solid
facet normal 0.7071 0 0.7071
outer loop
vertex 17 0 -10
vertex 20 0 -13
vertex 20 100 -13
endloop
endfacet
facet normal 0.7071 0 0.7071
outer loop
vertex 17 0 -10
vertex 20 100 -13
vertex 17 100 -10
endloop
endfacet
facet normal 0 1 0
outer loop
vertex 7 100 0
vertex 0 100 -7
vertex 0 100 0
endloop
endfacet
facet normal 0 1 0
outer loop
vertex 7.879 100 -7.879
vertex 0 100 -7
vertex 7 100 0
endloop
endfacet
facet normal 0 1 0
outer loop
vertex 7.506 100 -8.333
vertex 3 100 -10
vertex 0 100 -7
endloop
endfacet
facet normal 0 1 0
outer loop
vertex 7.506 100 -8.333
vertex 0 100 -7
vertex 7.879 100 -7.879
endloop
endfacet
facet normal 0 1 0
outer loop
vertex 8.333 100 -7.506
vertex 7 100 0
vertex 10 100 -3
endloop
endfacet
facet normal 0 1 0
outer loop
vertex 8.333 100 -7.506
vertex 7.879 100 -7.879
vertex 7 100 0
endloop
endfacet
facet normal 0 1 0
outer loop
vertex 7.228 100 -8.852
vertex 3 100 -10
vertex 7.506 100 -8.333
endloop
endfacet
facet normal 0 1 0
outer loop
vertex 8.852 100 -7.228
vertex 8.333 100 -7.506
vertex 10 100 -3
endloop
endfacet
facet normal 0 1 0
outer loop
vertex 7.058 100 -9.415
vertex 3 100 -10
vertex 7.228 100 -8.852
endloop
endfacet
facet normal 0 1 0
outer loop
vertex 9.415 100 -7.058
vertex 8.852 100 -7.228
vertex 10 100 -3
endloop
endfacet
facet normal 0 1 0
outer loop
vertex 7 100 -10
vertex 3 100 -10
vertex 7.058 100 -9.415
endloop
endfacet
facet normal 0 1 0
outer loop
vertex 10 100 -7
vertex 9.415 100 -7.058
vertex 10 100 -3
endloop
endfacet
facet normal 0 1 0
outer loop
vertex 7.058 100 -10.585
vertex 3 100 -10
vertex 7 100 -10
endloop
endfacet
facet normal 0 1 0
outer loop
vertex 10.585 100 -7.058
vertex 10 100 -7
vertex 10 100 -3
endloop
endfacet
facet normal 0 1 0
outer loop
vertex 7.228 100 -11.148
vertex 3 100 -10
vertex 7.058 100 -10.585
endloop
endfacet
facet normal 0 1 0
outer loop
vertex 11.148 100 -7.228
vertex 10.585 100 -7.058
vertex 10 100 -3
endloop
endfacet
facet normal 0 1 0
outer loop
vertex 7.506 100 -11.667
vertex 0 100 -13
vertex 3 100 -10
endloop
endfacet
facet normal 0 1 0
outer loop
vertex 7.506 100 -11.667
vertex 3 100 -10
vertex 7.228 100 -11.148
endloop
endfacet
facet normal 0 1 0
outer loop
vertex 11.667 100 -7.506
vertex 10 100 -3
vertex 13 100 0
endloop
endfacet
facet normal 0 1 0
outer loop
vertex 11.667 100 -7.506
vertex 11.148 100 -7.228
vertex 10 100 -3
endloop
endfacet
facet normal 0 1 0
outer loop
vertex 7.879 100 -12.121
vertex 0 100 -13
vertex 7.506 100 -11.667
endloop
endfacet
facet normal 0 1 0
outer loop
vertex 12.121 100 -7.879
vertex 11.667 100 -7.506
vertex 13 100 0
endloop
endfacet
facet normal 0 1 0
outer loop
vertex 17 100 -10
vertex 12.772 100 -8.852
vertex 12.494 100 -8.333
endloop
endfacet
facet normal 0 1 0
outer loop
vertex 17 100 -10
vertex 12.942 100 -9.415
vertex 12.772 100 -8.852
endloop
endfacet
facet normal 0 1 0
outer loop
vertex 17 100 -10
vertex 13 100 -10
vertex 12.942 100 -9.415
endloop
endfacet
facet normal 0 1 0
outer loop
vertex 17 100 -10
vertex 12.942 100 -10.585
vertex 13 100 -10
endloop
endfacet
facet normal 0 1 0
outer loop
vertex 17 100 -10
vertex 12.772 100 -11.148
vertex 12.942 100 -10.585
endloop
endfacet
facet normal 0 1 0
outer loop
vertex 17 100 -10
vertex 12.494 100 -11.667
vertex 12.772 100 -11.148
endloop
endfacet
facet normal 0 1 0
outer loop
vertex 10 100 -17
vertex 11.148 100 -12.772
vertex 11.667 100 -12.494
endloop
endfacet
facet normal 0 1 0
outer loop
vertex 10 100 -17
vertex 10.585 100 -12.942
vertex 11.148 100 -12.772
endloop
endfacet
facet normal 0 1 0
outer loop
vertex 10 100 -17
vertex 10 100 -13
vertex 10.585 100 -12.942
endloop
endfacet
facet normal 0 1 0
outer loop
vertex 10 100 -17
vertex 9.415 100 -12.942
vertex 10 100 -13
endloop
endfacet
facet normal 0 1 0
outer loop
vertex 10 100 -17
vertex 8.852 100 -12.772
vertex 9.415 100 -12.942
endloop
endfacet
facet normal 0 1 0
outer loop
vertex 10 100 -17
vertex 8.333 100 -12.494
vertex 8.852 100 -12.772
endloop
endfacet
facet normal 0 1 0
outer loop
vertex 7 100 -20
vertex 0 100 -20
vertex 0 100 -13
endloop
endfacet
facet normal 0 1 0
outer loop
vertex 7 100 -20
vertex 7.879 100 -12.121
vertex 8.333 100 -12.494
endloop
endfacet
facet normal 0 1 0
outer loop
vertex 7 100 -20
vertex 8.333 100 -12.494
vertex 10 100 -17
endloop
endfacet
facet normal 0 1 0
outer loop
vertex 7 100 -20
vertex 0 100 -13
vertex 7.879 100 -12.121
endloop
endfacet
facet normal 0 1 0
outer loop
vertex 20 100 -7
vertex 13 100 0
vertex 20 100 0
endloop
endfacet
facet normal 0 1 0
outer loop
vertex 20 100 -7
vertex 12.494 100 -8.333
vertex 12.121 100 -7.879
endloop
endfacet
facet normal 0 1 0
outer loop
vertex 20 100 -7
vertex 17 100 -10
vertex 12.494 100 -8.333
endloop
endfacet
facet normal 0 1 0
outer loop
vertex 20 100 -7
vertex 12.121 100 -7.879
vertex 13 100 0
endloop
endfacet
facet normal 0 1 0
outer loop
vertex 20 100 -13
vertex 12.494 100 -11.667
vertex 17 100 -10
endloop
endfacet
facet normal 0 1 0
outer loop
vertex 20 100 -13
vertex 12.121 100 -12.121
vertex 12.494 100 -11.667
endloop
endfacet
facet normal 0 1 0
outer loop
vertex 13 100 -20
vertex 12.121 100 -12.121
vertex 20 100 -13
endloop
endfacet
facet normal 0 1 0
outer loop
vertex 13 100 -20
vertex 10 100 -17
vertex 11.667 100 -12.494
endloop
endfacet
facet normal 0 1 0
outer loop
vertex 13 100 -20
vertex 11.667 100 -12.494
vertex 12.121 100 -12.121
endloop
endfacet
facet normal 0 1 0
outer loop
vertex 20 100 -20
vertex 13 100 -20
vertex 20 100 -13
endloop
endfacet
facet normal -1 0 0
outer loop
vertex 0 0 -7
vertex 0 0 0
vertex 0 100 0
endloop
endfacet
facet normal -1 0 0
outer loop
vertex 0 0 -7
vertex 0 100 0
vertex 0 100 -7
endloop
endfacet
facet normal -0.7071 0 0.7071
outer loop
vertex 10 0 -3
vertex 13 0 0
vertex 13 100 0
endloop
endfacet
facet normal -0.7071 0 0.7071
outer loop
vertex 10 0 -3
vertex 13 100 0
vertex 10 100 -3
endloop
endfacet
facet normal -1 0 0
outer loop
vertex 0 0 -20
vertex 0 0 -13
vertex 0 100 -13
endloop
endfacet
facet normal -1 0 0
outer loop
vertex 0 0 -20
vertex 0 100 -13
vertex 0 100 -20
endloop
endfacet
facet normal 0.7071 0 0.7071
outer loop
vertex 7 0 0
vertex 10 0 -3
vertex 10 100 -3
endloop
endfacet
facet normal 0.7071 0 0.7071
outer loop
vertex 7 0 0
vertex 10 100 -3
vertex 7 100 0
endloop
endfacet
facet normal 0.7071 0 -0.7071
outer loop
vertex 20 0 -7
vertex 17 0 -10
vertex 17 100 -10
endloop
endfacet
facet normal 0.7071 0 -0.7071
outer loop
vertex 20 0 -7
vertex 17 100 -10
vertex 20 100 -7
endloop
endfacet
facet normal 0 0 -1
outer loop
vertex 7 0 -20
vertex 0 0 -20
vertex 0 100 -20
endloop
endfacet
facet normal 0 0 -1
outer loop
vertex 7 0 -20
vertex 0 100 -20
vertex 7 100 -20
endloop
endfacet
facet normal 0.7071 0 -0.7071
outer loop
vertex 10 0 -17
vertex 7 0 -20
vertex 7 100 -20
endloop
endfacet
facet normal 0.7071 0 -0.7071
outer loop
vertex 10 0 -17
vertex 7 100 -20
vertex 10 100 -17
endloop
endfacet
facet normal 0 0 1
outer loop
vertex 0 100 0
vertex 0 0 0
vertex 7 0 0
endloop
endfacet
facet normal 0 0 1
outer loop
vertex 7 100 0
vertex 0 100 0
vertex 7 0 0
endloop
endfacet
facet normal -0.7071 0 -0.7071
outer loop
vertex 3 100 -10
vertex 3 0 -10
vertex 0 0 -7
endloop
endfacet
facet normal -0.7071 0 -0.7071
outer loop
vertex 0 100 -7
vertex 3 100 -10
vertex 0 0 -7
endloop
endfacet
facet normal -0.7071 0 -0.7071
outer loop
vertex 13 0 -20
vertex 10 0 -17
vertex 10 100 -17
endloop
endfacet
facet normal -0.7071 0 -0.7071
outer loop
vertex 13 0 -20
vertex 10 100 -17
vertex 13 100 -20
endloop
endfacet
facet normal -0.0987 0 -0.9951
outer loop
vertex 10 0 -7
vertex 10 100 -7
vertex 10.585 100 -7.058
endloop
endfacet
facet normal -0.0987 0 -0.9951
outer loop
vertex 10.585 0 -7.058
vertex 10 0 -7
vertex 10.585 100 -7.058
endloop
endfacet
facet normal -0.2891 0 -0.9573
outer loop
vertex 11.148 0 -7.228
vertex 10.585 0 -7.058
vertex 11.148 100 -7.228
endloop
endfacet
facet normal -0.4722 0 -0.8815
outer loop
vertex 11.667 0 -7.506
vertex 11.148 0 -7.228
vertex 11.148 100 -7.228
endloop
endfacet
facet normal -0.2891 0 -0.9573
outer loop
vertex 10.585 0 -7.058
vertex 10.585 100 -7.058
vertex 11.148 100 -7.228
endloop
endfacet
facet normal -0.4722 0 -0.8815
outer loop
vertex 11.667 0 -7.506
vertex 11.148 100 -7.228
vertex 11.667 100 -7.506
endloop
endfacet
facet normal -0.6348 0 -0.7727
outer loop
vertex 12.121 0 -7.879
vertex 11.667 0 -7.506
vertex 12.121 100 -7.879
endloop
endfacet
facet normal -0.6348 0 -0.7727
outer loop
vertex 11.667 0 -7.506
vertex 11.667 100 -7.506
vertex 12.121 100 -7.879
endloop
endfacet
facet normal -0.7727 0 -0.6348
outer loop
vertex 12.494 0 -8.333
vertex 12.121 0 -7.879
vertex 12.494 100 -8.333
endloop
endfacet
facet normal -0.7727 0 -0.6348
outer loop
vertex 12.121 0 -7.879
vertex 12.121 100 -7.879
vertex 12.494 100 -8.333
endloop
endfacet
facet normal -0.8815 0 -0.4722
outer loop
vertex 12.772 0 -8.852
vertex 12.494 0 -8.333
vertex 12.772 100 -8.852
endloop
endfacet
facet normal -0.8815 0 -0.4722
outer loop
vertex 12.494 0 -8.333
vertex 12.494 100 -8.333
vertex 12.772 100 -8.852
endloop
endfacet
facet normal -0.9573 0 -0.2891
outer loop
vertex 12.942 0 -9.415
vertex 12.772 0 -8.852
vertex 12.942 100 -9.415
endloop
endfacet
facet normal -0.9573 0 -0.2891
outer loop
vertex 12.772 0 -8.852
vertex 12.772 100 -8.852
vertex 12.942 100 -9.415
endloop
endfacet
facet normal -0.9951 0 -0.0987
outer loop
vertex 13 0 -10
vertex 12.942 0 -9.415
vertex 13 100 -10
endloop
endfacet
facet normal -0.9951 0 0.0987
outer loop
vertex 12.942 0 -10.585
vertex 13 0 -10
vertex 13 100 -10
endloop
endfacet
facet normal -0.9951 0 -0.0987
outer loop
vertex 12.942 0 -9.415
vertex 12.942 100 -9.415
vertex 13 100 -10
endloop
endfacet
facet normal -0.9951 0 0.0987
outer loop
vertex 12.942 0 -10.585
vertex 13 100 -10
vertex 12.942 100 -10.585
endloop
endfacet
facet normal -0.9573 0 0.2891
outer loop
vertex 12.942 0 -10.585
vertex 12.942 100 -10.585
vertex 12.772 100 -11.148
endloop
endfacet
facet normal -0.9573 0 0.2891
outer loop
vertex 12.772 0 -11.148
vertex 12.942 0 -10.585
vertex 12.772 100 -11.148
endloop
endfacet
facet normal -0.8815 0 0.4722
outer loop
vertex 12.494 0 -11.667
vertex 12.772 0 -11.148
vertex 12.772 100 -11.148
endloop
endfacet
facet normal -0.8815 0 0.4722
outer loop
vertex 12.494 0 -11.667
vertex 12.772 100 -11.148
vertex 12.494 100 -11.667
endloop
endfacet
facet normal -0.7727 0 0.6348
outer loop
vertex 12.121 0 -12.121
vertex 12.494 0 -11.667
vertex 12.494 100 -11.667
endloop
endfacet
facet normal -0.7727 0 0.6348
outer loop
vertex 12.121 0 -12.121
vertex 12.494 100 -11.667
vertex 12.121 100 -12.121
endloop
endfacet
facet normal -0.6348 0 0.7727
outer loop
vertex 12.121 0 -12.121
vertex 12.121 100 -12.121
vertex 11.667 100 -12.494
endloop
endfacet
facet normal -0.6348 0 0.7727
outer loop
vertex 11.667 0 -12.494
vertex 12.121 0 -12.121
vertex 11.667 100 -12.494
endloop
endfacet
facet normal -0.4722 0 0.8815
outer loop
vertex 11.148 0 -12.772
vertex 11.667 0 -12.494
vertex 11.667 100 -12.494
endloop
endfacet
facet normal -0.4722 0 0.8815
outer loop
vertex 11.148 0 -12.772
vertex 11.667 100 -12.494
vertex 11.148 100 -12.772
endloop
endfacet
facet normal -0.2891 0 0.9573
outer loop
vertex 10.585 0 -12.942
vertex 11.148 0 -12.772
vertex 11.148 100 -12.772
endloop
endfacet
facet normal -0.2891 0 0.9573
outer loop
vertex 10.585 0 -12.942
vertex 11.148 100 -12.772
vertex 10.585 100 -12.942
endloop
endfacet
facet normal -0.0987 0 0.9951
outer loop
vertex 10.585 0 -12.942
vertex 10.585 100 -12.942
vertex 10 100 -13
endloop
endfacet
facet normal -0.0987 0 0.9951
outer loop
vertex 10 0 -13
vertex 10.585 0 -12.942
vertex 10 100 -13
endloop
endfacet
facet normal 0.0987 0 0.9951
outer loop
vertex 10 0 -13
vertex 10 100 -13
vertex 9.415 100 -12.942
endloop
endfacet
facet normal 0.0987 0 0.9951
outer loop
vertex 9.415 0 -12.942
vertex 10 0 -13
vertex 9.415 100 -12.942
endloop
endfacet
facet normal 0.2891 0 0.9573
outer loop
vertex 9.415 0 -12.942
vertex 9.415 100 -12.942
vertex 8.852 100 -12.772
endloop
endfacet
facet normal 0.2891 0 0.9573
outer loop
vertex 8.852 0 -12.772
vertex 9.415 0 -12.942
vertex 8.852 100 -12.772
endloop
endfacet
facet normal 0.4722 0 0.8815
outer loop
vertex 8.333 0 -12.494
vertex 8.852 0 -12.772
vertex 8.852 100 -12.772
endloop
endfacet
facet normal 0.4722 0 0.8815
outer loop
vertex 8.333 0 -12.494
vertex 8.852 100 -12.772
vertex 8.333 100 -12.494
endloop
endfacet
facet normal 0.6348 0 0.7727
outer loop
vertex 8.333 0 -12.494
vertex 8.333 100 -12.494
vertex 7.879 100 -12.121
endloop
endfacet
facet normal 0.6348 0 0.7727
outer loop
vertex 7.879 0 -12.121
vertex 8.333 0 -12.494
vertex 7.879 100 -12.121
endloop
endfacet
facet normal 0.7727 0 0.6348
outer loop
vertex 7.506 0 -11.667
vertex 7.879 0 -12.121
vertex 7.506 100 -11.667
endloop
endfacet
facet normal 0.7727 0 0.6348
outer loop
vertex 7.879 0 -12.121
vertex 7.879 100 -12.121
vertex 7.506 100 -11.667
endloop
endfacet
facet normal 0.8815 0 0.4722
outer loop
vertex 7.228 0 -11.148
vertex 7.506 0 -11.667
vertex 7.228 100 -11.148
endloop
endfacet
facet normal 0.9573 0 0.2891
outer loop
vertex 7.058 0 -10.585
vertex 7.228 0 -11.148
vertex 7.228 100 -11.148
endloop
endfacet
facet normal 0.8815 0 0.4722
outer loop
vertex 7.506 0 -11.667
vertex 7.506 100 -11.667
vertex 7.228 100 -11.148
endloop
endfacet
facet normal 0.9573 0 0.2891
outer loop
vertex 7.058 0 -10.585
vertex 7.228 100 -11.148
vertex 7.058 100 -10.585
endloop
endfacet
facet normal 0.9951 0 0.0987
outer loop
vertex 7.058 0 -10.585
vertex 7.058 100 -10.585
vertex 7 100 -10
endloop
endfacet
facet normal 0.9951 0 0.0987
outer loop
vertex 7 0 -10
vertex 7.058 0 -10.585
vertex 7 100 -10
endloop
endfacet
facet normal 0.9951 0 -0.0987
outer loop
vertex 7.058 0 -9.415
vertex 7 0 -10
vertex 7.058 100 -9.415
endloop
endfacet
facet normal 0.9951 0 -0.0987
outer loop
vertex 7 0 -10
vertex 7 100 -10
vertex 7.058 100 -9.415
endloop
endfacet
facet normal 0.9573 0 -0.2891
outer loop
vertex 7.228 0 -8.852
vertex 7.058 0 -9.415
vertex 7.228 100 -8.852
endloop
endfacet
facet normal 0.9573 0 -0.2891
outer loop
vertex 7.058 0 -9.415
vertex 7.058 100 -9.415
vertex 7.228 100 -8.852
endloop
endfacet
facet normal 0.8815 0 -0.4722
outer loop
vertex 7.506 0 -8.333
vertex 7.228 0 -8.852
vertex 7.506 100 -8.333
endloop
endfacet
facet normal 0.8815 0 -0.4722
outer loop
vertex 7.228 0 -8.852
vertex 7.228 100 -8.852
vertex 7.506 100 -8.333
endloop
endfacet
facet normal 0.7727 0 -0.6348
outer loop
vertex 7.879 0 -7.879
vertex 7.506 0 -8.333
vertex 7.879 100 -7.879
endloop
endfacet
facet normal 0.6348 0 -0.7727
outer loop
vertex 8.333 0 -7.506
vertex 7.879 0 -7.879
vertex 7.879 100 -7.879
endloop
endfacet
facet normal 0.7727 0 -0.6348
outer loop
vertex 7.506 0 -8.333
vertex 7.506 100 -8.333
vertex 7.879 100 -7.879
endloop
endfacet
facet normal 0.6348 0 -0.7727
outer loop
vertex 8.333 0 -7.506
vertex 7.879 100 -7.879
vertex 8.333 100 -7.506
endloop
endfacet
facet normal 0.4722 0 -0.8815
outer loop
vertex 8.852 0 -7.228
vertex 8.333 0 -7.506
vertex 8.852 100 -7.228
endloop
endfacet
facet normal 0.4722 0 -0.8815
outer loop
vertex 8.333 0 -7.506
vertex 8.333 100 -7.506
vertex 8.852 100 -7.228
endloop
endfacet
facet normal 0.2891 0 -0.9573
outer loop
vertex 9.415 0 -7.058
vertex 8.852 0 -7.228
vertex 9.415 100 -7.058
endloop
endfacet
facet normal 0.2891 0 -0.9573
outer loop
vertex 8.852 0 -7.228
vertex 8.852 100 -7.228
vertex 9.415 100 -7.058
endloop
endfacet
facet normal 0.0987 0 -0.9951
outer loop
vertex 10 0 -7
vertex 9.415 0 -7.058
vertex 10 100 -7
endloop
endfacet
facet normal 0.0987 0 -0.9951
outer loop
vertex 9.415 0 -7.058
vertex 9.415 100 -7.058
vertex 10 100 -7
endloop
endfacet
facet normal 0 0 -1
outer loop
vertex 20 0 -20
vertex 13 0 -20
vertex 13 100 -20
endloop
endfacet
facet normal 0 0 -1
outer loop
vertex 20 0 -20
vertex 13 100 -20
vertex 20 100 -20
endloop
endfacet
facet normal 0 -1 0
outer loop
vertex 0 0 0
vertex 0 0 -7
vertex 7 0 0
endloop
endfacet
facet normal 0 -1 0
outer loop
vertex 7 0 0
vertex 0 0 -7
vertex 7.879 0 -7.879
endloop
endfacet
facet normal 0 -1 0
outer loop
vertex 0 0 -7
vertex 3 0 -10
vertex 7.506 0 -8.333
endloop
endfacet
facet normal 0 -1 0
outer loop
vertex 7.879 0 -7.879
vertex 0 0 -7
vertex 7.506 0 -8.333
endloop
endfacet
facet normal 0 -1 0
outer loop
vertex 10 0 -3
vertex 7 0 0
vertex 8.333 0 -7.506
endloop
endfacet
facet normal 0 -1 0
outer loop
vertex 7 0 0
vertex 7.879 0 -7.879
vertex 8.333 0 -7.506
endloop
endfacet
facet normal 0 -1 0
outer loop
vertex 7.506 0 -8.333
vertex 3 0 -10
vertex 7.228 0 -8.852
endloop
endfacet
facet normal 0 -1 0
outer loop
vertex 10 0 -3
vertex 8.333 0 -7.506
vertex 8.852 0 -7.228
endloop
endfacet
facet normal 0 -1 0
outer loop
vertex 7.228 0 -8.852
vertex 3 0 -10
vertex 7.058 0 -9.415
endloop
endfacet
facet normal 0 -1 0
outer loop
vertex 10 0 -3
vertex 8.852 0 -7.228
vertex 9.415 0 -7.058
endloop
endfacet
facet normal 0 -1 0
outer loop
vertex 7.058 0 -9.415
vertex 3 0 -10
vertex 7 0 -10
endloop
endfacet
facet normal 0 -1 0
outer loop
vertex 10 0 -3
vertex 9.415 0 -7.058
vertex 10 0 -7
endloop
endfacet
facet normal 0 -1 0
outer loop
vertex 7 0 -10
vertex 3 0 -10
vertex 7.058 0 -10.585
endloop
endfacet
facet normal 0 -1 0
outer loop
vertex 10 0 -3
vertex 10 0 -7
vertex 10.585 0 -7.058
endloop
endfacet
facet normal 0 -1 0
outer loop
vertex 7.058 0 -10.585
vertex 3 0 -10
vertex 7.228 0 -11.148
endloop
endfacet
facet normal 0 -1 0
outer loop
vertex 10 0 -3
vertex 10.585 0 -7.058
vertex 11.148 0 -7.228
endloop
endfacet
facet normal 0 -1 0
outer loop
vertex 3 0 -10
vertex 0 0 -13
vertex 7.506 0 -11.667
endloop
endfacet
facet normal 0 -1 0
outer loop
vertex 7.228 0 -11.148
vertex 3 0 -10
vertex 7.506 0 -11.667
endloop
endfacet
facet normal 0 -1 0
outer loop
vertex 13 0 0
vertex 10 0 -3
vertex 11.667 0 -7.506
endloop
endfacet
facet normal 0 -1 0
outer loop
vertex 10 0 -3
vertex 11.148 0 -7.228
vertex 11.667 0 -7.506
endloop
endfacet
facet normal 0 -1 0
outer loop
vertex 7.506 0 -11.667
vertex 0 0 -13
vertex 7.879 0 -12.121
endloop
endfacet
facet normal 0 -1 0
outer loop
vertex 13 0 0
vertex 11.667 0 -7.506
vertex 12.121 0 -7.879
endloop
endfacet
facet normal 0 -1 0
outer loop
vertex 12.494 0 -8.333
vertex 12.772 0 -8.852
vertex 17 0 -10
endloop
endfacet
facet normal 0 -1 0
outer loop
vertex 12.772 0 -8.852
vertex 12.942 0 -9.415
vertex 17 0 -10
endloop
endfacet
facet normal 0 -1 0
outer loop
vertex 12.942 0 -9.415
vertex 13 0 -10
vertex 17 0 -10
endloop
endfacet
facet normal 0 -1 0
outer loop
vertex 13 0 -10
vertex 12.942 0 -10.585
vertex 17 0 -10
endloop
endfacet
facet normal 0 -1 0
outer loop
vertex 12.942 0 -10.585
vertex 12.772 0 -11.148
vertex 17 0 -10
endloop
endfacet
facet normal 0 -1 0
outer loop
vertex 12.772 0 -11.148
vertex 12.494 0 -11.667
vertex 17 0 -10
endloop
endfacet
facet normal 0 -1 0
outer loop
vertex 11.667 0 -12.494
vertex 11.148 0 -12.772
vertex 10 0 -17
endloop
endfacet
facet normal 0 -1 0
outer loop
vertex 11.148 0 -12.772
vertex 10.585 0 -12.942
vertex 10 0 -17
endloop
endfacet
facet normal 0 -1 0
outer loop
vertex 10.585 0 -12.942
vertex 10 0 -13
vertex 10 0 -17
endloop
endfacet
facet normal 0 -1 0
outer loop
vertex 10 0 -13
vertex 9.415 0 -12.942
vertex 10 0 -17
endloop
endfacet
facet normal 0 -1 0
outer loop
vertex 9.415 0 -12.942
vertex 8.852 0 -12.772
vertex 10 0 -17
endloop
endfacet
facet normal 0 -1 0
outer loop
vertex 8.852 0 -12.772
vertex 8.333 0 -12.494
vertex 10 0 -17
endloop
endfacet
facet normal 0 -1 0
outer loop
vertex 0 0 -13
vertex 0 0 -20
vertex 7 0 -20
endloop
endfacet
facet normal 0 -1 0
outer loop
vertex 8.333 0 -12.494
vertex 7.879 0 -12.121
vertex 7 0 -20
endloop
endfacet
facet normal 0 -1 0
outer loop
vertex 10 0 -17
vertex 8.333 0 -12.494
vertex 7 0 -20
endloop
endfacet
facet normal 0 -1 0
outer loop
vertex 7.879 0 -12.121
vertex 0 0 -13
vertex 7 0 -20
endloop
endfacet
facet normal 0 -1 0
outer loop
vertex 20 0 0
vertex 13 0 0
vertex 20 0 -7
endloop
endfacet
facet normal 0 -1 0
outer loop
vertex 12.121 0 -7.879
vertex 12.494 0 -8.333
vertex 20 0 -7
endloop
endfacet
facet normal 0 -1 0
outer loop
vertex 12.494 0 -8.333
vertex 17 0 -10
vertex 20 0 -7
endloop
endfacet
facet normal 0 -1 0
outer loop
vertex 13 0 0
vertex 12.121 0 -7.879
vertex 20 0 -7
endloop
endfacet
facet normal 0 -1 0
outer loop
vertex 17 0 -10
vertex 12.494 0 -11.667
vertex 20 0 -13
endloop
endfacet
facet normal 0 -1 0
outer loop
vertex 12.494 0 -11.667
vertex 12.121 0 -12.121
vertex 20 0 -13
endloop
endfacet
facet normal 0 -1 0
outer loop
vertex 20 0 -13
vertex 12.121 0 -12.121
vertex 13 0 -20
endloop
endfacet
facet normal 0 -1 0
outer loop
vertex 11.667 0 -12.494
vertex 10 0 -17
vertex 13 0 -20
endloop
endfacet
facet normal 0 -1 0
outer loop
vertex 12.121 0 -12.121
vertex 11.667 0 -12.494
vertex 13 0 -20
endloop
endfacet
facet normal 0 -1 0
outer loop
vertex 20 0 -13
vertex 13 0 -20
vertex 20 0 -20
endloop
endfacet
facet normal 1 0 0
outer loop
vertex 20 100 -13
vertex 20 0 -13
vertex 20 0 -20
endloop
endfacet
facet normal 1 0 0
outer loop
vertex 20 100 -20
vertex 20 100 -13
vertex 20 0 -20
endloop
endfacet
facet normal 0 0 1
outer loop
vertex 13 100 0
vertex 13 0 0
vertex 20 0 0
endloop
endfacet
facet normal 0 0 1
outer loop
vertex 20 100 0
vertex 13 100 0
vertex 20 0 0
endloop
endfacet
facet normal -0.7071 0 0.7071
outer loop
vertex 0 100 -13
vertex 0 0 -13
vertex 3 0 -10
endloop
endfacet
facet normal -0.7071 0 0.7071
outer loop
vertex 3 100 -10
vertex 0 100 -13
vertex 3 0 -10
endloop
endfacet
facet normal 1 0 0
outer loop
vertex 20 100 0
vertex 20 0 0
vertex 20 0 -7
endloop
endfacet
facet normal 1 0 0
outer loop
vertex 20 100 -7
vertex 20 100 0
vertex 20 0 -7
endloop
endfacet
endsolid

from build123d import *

# Parameters (mm, degrees)
SKIZZE1_W                       = 20
SKIZZE1_H                       = 20
AUFSATZ_LINEAR_AUSTRAGEN1_DEPTH = 100
SCHNITT_LINEAR_AUSTRAGEN1_DEPTH = 104.923048454
SKETCH1_R                       = 3
EXTRUDE1_DEPTH                  = 104.923048454


with BuildPart() as part:
    # Skizze1 → Aufsatz-Linear austragen1 (new body)
    with BuildSketch(Plane(origin=(0, 0, 0), x_dir=(1, 0, 0), z_dir=(0, 1, 0))):
        with Locations((10, 10)):
            Rectangle(SKIZZE1_W, SKIZZE1_H)
    extrude(amount=AUFSATZ_LINEAR_AUSTRAGEN1_DEPTH)

    # Skizze2 → Schnitt-Linear austragen1 (cut, through all)
    with BuildSketch(Plane(origin=(0, 100, 0), x_dir=(1, 0, 0), z_dir=(0, 1, 0))):
        Polygon((7, 20), (10, 17), (13, 20), align=None)
        Polygon((20, 13), (17, 10), (20, 7), align=None)
        Polygon((0, 7), (0, 13), (3, 10), align=None)
        Polygon((7, 0), (13, 0), (10, 3), align=None)
    extrude(amount=-SCHNITT_LINEAR_AUSTRAGEN1_DEPTH, mode=Mode.SUBTRACT)

    # Sketch1 → Extrude1 (cut, through all)
    with BuildSketch(Plane(origin=(0, 100, 0), x_dir=(1, 0, 0), z_dir=(0, 1, 0))):
        with Locations(Location((10, 10, 0), (0, 0, 270))):
            Circle(SKETCH1_R)
    extrude(amount=-EXTRUDE1_DEPTH, mode=Mode.SUBTRACT)


solid = part.part
